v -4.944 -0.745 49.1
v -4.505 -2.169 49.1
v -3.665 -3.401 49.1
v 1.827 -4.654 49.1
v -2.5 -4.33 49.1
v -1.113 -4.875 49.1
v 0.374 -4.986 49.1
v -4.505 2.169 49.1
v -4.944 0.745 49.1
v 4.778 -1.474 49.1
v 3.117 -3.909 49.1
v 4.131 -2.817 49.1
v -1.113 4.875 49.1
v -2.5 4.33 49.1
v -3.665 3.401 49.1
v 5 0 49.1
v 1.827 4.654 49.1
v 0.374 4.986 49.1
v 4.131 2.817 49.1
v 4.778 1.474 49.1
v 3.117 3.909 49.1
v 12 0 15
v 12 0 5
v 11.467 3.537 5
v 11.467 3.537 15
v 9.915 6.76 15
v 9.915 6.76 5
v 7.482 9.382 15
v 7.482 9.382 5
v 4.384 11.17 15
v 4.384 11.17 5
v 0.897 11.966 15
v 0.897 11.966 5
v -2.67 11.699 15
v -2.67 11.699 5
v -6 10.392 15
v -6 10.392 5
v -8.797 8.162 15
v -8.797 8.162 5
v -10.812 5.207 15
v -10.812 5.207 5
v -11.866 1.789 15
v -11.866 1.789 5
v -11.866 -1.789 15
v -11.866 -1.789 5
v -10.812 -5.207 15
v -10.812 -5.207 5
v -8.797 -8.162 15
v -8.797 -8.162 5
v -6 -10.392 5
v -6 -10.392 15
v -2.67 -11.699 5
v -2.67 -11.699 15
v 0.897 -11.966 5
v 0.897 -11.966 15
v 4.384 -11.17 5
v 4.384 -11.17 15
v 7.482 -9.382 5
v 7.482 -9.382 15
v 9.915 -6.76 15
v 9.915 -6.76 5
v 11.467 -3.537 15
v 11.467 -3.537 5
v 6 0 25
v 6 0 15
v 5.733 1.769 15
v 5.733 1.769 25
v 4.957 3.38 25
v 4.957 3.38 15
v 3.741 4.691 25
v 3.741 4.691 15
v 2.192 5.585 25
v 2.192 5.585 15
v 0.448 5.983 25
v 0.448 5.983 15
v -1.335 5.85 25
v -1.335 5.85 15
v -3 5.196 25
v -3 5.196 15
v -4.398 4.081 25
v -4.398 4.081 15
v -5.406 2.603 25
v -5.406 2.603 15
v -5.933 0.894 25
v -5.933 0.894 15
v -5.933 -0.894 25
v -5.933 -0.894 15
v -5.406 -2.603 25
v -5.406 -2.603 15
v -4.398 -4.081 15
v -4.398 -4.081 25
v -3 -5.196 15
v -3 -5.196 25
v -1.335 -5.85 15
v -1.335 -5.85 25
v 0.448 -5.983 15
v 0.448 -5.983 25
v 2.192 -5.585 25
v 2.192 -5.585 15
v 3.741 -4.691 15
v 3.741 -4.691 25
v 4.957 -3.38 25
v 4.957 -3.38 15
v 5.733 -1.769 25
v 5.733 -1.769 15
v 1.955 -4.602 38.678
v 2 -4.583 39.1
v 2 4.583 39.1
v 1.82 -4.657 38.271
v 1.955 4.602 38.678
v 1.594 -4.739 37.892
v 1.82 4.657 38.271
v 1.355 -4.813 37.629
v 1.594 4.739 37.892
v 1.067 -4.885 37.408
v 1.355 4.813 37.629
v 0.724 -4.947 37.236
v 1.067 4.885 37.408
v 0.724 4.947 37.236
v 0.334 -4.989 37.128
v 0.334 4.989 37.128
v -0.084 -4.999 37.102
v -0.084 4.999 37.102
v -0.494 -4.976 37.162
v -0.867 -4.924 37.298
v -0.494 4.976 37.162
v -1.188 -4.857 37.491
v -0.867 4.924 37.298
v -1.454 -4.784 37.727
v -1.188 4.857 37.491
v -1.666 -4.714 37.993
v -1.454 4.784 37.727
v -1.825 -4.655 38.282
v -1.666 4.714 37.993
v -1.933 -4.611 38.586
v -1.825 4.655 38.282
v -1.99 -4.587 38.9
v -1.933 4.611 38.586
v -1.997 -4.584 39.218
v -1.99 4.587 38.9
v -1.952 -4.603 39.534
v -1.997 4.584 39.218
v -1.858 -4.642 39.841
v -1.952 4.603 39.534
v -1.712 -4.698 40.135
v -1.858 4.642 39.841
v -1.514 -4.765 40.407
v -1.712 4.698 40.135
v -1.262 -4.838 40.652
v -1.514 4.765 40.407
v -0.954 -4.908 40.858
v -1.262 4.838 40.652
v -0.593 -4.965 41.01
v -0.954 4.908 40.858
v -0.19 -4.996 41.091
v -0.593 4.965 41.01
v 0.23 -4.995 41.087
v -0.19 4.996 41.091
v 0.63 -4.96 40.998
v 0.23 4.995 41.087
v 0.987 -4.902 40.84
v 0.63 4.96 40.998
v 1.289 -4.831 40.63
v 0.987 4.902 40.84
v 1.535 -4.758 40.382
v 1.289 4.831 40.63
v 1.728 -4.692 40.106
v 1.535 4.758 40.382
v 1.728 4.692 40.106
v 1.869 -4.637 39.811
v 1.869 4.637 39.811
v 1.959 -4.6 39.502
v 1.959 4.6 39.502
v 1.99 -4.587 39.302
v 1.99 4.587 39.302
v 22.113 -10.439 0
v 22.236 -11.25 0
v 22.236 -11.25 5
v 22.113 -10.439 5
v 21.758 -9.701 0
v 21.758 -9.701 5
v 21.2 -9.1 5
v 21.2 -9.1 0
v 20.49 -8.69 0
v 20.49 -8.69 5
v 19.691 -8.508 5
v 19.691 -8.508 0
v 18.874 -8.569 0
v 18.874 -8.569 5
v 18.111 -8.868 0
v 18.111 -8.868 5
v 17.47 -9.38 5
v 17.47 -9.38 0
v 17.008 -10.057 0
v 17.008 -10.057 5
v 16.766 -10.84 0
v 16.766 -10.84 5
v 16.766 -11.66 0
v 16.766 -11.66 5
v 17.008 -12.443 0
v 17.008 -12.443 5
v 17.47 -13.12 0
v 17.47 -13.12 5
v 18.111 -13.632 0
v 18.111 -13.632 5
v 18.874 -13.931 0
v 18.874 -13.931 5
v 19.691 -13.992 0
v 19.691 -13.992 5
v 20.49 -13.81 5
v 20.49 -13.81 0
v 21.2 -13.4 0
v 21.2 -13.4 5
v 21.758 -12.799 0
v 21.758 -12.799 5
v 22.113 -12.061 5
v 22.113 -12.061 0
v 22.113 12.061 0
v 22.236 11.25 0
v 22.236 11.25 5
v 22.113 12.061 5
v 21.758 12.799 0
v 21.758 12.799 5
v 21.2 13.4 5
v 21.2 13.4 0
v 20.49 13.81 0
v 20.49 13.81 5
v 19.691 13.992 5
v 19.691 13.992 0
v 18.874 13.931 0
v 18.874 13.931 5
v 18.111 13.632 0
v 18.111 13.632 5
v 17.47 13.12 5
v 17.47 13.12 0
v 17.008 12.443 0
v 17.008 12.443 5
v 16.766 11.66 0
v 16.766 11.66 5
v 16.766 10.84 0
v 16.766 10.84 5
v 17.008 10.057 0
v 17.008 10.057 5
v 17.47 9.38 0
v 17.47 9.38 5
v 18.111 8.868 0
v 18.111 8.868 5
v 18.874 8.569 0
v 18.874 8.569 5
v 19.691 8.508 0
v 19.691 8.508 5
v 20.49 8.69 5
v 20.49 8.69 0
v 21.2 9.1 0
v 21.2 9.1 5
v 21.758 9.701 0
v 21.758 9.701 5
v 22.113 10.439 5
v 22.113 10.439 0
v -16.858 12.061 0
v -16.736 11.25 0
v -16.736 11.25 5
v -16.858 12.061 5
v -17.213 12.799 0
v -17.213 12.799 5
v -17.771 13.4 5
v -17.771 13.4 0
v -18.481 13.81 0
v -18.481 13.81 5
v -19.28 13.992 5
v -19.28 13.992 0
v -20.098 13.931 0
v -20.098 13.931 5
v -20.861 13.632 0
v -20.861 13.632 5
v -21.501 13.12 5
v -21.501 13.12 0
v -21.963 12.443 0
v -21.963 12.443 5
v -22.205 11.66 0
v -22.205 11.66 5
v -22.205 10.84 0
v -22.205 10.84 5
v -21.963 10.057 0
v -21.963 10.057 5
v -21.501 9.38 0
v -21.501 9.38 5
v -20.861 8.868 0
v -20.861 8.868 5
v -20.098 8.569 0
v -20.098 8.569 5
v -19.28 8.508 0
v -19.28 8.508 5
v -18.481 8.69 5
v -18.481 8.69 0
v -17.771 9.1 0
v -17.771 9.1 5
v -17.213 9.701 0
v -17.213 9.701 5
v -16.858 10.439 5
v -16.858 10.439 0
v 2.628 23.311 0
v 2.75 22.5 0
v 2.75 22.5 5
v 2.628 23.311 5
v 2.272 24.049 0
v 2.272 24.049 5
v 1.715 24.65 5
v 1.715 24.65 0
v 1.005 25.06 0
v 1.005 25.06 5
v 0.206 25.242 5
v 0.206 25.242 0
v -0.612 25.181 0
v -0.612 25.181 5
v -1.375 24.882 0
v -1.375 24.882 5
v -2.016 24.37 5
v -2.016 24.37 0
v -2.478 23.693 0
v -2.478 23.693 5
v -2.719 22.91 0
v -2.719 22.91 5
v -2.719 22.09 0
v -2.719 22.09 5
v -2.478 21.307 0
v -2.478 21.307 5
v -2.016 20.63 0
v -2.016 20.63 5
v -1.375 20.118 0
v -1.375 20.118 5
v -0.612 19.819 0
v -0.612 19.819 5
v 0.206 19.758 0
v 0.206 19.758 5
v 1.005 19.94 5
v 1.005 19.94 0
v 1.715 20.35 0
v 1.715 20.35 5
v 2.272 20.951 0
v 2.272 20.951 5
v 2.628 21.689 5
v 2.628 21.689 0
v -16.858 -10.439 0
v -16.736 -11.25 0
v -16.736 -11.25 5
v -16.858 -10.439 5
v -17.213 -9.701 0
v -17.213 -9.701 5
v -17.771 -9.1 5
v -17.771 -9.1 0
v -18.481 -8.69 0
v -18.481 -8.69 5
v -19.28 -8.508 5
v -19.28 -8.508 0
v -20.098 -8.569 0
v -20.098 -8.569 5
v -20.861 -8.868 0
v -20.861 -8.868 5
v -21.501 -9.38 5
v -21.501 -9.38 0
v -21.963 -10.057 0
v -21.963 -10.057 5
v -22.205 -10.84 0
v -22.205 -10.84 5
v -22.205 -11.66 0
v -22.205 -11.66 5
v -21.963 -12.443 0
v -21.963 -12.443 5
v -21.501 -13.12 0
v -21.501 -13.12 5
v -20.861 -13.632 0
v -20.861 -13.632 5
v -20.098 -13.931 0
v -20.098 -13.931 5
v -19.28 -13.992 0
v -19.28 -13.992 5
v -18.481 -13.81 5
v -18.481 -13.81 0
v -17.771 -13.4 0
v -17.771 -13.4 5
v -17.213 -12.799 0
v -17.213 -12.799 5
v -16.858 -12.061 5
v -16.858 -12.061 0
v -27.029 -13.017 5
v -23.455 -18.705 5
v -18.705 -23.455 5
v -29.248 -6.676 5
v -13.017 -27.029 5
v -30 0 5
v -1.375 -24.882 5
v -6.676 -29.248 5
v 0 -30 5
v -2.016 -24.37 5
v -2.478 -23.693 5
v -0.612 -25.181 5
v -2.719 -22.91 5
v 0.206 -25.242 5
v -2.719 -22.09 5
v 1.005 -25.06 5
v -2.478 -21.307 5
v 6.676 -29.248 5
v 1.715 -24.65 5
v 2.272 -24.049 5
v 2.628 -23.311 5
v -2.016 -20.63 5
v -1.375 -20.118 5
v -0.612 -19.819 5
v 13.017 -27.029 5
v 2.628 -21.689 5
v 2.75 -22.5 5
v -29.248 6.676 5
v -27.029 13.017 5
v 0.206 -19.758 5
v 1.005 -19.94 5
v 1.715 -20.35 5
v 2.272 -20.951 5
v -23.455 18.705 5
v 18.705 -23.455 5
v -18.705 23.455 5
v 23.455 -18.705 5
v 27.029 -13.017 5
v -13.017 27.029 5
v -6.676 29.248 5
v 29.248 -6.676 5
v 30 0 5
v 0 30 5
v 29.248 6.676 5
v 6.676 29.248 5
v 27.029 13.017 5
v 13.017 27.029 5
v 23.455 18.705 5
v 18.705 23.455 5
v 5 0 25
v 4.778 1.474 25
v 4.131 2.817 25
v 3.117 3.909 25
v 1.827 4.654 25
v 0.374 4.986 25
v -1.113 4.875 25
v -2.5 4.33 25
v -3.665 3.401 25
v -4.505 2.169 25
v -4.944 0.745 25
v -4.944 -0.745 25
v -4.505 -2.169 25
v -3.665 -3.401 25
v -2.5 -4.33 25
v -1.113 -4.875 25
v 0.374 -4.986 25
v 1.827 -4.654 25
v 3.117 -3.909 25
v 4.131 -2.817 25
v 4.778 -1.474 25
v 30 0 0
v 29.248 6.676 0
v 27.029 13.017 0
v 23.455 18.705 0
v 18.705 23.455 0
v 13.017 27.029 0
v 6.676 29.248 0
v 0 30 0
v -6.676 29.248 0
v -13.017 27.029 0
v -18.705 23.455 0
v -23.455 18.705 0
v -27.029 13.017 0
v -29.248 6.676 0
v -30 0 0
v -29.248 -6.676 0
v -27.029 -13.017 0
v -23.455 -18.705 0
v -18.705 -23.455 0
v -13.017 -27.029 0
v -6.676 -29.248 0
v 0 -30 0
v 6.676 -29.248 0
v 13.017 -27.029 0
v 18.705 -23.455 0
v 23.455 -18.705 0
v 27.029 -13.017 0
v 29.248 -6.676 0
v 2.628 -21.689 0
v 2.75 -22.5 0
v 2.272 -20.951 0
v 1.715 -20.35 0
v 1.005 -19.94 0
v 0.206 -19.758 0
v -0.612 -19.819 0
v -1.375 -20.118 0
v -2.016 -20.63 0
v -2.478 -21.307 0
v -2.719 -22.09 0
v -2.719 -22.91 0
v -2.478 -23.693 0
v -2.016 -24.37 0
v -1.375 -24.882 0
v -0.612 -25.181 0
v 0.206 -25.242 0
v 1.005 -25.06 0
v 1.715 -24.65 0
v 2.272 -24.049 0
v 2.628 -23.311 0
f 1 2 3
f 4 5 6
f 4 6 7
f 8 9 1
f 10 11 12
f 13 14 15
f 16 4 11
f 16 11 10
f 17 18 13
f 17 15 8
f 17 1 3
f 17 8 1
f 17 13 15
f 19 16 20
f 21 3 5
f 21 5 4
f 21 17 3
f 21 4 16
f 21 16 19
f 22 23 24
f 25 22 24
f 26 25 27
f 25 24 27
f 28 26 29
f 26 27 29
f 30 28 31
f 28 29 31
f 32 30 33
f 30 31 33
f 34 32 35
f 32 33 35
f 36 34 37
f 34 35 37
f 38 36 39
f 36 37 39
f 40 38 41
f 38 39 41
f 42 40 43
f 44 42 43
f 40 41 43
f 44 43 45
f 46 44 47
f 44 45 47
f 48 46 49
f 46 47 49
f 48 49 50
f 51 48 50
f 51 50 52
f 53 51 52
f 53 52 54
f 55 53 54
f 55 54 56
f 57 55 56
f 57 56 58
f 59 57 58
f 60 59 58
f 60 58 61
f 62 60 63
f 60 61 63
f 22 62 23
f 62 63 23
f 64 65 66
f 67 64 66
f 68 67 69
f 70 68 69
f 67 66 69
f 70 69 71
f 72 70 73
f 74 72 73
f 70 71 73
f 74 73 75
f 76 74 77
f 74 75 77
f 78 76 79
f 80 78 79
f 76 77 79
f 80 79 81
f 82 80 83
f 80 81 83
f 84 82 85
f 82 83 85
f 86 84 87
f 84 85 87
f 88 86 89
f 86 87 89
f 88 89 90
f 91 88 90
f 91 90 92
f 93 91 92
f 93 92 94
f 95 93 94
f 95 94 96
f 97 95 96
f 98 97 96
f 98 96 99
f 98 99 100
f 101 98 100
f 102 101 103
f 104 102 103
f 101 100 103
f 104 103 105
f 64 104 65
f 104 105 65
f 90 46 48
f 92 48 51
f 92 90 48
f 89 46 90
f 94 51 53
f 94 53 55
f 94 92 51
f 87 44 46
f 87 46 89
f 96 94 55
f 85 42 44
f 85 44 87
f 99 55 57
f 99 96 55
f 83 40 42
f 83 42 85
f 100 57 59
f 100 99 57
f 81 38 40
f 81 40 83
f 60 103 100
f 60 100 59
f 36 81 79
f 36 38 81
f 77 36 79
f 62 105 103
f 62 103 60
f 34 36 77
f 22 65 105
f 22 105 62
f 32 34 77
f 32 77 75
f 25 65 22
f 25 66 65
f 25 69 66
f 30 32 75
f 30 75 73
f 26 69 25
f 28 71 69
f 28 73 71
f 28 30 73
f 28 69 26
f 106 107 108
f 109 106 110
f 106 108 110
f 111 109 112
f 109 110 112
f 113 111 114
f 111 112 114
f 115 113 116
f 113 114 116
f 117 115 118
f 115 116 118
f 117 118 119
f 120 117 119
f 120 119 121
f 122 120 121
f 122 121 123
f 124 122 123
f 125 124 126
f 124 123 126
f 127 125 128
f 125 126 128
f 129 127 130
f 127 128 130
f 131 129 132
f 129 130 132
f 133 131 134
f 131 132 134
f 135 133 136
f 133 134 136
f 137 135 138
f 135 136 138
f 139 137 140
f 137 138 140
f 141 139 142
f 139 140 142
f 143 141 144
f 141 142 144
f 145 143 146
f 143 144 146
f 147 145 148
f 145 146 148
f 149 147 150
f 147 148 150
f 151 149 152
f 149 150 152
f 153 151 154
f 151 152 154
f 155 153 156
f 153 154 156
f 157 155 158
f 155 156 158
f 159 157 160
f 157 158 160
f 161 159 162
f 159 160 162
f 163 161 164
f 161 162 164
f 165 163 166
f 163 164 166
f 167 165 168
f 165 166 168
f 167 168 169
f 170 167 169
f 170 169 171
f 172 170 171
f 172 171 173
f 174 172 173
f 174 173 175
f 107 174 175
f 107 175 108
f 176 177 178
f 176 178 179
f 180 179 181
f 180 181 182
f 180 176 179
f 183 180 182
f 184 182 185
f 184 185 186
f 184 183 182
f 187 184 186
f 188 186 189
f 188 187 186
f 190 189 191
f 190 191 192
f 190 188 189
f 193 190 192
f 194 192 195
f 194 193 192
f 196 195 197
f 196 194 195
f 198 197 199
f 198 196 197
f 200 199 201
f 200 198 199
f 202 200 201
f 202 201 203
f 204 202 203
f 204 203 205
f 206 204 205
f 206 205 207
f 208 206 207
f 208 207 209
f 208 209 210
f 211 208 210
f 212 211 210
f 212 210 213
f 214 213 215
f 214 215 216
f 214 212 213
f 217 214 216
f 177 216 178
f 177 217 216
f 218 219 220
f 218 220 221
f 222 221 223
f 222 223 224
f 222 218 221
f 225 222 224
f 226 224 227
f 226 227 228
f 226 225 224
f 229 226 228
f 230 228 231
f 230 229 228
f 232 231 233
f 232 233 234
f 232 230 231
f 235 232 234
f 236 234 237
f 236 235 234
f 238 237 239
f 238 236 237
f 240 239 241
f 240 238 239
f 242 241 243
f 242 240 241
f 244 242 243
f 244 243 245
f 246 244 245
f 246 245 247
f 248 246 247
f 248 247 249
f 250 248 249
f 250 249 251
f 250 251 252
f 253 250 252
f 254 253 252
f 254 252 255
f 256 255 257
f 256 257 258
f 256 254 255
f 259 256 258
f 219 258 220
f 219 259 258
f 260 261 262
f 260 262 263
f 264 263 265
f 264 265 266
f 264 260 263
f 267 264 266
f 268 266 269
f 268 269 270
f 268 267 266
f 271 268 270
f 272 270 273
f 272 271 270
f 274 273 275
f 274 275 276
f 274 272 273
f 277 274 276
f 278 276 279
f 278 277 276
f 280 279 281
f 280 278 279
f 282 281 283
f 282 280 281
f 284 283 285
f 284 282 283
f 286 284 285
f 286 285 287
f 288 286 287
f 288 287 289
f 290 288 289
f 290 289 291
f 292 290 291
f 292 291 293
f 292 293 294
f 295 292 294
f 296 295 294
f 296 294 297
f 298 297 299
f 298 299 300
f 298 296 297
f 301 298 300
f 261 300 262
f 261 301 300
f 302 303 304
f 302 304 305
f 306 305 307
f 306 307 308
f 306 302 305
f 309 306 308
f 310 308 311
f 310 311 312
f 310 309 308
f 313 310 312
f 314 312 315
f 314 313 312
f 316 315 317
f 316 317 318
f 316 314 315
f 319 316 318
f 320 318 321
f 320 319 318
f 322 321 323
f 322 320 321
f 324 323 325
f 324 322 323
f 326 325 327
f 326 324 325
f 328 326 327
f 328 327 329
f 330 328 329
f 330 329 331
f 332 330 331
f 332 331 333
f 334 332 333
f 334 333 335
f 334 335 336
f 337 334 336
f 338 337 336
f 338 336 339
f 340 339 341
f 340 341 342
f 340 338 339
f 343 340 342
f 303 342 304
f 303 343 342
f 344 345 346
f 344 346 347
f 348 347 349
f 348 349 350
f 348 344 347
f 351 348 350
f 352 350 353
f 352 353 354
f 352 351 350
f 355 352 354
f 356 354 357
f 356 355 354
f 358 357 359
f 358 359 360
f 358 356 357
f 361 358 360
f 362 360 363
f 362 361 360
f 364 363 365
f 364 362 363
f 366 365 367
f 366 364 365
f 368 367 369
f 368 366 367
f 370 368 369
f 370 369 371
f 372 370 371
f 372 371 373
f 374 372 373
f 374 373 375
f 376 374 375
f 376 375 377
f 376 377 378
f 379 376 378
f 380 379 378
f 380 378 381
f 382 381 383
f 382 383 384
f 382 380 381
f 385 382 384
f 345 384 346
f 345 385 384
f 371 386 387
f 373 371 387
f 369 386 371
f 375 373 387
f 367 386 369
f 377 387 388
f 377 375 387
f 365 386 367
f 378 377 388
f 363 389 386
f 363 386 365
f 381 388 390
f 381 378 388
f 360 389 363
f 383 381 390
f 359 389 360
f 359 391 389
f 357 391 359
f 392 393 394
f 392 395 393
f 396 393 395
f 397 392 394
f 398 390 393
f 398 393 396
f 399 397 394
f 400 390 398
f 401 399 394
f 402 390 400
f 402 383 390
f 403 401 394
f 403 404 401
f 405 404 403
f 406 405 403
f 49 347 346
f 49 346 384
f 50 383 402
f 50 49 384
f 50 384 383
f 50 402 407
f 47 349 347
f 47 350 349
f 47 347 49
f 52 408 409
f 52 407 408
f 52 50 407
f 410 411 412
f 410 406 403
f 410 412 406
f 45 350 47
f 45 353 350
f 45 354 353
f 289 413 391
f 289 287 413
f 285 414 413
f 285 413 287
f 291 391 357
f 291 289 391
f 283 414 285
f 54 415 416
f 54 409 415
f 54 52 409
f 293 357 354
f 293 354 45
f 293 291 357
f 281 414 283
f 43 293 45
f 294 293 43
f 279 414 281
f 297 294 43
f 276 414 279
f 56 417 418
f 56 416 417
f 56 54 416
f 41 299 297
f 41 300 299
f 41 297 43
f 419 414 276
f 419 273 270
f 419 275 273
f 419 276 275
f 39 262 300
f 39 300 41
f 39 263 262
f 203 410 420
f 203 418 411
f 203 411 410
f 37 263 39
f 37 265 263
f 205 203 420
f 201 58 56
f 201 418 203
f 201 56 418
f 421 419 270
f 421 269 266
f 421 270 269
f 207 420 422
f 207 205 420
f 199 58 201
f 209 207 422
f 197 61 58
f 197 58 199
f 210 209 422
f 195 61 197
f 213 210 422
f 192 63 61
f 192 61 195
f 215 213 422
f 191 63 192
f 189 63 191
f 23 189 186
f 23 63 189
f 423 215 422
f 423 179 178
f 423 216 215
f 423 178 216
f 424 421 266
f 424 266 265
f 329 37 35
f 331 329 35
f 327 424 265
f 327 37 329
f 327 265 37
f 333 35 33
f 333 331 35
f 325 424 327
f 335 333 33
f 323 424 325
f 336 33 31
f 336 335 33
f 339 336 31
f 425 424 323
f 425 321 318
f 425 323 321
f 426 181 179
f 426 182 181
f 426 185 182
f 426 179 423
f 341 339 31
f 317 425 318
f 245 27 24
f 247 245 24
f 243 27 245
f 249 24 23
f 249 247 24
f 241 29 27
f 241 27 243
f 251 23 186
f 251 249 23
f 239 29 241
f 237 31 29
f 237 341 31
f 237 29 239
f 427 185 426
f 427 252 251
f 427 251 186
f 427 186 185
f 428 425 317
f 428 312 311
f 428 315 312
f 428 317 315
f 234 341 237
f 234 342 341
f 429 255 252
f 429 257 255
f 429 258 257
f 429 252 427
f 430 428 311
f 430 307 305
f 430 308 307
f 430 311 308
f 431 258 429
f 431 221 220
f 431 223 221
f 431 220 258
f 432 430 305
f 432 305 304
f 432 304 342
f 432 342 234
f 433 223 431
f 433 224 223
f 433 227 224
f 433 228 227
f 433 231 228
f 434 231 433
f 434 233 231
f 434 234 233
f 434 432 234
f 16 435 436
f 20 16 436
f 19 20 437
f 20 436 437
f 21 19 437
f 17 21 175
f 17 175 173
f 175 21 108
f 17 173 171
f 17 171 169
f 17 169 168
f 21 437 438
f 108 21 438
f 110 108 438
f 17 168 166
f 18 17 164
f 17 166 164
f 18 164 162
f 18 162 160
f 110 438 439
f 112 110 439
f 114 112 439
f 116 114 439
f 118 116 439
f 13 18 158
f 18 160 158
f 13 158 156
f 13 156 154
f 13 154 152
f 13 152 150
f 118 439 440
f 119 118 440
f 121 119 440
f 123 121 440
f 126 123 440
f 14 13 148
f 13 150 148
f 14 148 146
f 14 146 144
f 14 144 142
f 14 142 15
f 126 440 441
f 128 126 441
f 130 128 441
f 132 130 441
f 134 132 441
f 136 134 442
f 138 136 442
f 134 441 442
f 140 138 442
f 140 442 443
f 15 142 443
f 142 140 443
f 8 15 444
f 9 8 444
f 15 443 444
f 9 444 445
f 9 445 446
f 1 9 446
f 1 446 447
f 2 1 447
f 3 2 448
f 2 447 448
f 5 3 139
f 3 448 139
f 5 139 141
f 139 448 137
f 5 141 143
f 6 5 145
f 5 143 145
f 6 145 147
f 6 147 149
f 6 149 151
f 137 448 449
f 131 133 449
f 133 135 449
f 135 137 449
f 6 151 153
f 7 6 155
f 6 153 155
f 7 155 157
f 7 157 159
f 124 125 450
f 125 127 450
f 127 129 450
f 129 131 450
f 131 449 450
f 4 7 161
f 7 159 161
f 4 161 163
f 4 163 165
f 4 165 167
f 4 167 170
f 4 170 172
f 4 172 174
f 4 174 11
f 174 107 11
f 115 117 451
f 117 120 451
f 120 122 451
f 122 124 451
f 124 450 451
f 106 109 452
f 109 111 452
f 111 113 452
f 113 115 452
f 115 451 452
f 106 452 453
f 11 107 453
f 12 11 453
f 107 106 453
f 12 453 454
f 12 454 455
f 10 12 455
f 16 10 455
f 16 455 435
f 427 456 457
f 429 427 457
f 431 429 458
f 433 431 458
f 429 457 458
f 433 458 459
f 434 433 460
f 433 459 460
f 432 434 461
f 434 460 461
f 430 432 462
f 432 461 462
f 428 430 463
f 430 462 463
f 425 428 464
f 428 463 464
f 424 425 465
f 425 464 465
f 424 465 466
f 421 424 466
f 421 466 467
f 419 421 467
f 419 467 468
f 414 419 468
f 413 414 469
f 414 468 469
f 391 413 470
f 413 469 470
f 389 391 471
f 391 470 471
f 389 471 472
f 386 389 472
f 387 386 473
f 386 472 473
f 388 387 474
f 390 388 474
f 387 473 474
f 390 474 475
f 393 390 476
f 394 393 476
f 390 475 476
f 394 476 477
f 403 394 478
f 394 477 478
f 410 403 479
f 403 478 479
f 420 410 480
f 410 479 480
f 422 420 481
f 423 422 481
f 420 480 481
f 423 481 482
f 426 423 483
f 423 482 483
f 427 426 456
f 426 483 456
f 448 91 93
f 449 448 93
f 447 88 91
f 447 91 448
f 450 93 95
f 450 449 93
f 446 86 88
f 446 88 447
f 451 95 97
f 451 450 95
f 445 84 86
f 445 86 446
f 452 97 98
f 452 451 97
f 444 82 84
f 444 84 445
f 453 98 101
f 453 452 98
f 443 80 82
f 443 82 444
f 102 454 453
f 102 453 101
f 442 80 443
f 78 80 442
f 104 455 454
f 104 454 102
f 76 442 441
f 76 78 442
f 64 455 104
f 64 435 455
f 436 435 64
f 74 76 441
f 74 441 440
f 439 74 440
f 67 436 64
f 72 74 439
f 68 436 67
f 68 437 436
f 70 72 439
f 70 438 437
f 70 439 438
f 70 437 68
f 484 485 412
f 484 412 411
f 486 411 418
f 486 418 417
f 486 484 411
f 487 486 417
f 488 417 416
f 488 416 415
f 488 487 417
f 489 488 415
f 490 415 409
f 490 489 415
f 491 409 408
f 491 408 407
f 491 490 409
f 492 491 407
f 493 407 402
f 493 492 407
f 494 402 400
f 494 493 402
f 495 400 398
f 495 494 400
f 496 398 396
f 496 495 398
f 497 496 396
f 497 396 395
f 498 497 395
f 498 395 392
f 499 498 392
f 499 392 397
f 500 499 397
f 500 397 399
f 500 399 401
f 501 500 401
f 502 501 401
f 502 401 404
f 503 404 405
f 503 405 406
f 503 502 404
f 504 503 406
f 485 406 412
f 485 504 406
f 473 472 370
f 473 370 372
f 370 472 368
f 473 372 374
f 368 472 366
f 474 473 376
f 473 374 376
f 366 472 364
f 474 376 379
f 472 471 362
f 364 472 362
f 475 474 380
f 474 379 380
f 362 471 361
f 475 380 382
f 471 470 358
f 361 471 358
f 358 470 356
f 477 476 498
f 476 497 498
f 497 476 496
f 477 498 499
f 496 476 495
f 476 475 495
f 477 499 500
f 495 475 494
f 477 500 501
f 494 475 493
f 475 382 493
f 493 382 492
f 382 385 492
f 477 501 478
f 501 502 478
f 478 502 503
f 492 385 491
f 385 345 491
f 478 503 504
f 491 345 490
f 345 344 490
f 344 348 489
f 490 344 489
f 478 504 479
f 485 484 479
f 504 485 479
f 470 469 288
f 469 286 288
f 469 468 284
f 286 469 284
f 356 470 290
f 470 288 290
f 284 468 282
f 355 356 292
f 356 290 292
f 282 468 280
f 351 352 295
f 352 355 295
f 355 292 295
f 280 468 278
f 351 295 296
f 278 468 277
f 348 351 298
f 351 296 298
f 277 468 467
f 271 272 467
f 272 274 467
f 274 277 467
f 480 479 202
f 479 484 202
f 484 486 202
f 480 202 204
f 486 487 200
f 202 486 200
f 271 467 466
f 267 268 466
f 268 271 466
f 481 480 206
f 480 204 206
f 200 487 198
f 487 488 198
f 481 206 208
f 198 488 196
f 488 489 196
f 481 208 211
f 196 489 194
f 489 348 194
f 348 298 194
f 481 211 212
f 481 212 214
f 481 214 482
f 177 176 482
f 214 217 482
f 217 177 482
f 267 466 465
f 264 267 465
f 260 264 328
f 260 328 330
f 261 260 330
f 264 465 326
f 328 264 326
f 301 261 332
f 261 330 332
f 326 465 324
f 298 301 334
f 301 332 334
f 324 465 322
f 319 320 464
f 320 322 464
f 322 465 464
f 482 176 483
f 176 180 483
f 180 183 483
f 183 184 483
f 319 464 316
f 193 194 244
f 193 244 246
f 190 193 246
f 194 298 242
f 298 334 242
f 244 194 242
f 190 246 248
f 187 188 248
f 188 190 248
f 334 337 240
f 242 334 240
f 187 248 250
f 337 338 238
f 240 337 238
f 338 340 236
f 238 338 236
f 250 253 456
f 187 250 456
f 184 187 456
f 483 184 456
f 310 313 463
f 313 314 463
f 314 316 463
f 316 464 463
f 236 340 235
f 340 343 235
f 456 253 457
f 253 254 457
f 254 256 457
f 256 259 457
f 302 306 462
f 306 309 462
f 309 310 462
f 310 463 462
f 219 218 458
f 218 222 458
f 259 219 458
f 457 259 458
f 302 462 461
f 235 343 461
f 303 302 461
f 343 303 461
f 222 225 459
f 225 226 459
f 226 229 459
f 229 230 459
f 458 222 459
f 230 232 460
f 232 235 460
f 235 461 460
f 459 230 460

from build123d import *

# Parameters (mm, degrees)
SKETCH_1_R               = 30
SKETCH_1_R_2             = 2.75
EXTRUDE_1_DEPTH          = 5
SKETCH_2_R               = 12
EXTRUDE_2_DEPTH          = 10
SKETCH_3_R               = 6
EXTRUDE_3_DEPTH          = 10
SKETCH_5_R               = 5
EXTRUDE_4_DEPTH          = 24.1
CUT_EXTRUDE_1_DEPTH      = 10
CUT_EXTRUDE_1_DEPTH_BACK = 10
SKETCH_6_R               = 2


with BuildPart() as part:
    # 草图1 → 凸台-拉伸1 (new body)
    with BuildSketch(Plane.XY):
        Circle(SKETCH_1_R)
        with Locations((0, 22.5)):
            Circle(SKETCH_1_R_2, mode=Mode.SUBTRACT)
        with Locations((19.485571585, 11.25)):
            Circle(SKETCH_1_R_2, mode=Mode.SUBTRACT)
        with Locations((19.485571585, -11.25)):
            Circle(SKETCH_1_R_2, mode=Mode.SUBTRACT)
        with Locations((0, -22.5)):
            Circle(SKETCH_1_R_2, mode=Mode.SUBTRACT)
        with Locations((-19.485571585, -11.25)):
            Circle(SKETCH_1_R_2, mode=Mode.SUBTRACT)
        with Locations((-19.485571585, 11.25)):
            Circle(SKETCH_1_R_2, mode=Mode.SUBTRACT)
    extrude(amount=EXTRUDE_1_DEPTH)

    # 草图2 → 凸台-拉伸2 (add)
    with BuildSketch(Plane.XY.offset(5)):
        Circle(SKETCH_2_R)
    extrude(amount=EXTRUDE_2_DEPTH)

    # 草图3 → 凸台-拉伸3 (add)
    with BuildSketch(Plane.XY.offset(15)):
        Circle(SKETCH_3_R)
    extrude(amount=EXTRUDE_3_DEPTH)

    # 草图5 → 凸台-拉伸4 (add)
    with BuildSketch(Plane.XY.offset(25)):
        Circle(SKETCH_5_R)
    extrude(amount=EXTRUDE_4_DEPTH)

    # 草图6 → 切除-拉伸1 (cut, two sides: drawn at the far end of the back side and taken through both)
    with BuildSketch(Plane(origin=(0, 0, 0), x_dir=(1, 0, 0), z_dir=(0, 1, 0)).offset(-CUT_EXTRUDE_1_DEPTH_BACK)):
        with Locations((0, -39.1)):
            Circle(SKETCH_6_R)
    extrude(amount=CUT_EXTRUDE_1_DEPTH + CUT_EXTRUDE_1_DEPTH_BACK, mode=Mode.SUBTRACT)


solid = part.part
